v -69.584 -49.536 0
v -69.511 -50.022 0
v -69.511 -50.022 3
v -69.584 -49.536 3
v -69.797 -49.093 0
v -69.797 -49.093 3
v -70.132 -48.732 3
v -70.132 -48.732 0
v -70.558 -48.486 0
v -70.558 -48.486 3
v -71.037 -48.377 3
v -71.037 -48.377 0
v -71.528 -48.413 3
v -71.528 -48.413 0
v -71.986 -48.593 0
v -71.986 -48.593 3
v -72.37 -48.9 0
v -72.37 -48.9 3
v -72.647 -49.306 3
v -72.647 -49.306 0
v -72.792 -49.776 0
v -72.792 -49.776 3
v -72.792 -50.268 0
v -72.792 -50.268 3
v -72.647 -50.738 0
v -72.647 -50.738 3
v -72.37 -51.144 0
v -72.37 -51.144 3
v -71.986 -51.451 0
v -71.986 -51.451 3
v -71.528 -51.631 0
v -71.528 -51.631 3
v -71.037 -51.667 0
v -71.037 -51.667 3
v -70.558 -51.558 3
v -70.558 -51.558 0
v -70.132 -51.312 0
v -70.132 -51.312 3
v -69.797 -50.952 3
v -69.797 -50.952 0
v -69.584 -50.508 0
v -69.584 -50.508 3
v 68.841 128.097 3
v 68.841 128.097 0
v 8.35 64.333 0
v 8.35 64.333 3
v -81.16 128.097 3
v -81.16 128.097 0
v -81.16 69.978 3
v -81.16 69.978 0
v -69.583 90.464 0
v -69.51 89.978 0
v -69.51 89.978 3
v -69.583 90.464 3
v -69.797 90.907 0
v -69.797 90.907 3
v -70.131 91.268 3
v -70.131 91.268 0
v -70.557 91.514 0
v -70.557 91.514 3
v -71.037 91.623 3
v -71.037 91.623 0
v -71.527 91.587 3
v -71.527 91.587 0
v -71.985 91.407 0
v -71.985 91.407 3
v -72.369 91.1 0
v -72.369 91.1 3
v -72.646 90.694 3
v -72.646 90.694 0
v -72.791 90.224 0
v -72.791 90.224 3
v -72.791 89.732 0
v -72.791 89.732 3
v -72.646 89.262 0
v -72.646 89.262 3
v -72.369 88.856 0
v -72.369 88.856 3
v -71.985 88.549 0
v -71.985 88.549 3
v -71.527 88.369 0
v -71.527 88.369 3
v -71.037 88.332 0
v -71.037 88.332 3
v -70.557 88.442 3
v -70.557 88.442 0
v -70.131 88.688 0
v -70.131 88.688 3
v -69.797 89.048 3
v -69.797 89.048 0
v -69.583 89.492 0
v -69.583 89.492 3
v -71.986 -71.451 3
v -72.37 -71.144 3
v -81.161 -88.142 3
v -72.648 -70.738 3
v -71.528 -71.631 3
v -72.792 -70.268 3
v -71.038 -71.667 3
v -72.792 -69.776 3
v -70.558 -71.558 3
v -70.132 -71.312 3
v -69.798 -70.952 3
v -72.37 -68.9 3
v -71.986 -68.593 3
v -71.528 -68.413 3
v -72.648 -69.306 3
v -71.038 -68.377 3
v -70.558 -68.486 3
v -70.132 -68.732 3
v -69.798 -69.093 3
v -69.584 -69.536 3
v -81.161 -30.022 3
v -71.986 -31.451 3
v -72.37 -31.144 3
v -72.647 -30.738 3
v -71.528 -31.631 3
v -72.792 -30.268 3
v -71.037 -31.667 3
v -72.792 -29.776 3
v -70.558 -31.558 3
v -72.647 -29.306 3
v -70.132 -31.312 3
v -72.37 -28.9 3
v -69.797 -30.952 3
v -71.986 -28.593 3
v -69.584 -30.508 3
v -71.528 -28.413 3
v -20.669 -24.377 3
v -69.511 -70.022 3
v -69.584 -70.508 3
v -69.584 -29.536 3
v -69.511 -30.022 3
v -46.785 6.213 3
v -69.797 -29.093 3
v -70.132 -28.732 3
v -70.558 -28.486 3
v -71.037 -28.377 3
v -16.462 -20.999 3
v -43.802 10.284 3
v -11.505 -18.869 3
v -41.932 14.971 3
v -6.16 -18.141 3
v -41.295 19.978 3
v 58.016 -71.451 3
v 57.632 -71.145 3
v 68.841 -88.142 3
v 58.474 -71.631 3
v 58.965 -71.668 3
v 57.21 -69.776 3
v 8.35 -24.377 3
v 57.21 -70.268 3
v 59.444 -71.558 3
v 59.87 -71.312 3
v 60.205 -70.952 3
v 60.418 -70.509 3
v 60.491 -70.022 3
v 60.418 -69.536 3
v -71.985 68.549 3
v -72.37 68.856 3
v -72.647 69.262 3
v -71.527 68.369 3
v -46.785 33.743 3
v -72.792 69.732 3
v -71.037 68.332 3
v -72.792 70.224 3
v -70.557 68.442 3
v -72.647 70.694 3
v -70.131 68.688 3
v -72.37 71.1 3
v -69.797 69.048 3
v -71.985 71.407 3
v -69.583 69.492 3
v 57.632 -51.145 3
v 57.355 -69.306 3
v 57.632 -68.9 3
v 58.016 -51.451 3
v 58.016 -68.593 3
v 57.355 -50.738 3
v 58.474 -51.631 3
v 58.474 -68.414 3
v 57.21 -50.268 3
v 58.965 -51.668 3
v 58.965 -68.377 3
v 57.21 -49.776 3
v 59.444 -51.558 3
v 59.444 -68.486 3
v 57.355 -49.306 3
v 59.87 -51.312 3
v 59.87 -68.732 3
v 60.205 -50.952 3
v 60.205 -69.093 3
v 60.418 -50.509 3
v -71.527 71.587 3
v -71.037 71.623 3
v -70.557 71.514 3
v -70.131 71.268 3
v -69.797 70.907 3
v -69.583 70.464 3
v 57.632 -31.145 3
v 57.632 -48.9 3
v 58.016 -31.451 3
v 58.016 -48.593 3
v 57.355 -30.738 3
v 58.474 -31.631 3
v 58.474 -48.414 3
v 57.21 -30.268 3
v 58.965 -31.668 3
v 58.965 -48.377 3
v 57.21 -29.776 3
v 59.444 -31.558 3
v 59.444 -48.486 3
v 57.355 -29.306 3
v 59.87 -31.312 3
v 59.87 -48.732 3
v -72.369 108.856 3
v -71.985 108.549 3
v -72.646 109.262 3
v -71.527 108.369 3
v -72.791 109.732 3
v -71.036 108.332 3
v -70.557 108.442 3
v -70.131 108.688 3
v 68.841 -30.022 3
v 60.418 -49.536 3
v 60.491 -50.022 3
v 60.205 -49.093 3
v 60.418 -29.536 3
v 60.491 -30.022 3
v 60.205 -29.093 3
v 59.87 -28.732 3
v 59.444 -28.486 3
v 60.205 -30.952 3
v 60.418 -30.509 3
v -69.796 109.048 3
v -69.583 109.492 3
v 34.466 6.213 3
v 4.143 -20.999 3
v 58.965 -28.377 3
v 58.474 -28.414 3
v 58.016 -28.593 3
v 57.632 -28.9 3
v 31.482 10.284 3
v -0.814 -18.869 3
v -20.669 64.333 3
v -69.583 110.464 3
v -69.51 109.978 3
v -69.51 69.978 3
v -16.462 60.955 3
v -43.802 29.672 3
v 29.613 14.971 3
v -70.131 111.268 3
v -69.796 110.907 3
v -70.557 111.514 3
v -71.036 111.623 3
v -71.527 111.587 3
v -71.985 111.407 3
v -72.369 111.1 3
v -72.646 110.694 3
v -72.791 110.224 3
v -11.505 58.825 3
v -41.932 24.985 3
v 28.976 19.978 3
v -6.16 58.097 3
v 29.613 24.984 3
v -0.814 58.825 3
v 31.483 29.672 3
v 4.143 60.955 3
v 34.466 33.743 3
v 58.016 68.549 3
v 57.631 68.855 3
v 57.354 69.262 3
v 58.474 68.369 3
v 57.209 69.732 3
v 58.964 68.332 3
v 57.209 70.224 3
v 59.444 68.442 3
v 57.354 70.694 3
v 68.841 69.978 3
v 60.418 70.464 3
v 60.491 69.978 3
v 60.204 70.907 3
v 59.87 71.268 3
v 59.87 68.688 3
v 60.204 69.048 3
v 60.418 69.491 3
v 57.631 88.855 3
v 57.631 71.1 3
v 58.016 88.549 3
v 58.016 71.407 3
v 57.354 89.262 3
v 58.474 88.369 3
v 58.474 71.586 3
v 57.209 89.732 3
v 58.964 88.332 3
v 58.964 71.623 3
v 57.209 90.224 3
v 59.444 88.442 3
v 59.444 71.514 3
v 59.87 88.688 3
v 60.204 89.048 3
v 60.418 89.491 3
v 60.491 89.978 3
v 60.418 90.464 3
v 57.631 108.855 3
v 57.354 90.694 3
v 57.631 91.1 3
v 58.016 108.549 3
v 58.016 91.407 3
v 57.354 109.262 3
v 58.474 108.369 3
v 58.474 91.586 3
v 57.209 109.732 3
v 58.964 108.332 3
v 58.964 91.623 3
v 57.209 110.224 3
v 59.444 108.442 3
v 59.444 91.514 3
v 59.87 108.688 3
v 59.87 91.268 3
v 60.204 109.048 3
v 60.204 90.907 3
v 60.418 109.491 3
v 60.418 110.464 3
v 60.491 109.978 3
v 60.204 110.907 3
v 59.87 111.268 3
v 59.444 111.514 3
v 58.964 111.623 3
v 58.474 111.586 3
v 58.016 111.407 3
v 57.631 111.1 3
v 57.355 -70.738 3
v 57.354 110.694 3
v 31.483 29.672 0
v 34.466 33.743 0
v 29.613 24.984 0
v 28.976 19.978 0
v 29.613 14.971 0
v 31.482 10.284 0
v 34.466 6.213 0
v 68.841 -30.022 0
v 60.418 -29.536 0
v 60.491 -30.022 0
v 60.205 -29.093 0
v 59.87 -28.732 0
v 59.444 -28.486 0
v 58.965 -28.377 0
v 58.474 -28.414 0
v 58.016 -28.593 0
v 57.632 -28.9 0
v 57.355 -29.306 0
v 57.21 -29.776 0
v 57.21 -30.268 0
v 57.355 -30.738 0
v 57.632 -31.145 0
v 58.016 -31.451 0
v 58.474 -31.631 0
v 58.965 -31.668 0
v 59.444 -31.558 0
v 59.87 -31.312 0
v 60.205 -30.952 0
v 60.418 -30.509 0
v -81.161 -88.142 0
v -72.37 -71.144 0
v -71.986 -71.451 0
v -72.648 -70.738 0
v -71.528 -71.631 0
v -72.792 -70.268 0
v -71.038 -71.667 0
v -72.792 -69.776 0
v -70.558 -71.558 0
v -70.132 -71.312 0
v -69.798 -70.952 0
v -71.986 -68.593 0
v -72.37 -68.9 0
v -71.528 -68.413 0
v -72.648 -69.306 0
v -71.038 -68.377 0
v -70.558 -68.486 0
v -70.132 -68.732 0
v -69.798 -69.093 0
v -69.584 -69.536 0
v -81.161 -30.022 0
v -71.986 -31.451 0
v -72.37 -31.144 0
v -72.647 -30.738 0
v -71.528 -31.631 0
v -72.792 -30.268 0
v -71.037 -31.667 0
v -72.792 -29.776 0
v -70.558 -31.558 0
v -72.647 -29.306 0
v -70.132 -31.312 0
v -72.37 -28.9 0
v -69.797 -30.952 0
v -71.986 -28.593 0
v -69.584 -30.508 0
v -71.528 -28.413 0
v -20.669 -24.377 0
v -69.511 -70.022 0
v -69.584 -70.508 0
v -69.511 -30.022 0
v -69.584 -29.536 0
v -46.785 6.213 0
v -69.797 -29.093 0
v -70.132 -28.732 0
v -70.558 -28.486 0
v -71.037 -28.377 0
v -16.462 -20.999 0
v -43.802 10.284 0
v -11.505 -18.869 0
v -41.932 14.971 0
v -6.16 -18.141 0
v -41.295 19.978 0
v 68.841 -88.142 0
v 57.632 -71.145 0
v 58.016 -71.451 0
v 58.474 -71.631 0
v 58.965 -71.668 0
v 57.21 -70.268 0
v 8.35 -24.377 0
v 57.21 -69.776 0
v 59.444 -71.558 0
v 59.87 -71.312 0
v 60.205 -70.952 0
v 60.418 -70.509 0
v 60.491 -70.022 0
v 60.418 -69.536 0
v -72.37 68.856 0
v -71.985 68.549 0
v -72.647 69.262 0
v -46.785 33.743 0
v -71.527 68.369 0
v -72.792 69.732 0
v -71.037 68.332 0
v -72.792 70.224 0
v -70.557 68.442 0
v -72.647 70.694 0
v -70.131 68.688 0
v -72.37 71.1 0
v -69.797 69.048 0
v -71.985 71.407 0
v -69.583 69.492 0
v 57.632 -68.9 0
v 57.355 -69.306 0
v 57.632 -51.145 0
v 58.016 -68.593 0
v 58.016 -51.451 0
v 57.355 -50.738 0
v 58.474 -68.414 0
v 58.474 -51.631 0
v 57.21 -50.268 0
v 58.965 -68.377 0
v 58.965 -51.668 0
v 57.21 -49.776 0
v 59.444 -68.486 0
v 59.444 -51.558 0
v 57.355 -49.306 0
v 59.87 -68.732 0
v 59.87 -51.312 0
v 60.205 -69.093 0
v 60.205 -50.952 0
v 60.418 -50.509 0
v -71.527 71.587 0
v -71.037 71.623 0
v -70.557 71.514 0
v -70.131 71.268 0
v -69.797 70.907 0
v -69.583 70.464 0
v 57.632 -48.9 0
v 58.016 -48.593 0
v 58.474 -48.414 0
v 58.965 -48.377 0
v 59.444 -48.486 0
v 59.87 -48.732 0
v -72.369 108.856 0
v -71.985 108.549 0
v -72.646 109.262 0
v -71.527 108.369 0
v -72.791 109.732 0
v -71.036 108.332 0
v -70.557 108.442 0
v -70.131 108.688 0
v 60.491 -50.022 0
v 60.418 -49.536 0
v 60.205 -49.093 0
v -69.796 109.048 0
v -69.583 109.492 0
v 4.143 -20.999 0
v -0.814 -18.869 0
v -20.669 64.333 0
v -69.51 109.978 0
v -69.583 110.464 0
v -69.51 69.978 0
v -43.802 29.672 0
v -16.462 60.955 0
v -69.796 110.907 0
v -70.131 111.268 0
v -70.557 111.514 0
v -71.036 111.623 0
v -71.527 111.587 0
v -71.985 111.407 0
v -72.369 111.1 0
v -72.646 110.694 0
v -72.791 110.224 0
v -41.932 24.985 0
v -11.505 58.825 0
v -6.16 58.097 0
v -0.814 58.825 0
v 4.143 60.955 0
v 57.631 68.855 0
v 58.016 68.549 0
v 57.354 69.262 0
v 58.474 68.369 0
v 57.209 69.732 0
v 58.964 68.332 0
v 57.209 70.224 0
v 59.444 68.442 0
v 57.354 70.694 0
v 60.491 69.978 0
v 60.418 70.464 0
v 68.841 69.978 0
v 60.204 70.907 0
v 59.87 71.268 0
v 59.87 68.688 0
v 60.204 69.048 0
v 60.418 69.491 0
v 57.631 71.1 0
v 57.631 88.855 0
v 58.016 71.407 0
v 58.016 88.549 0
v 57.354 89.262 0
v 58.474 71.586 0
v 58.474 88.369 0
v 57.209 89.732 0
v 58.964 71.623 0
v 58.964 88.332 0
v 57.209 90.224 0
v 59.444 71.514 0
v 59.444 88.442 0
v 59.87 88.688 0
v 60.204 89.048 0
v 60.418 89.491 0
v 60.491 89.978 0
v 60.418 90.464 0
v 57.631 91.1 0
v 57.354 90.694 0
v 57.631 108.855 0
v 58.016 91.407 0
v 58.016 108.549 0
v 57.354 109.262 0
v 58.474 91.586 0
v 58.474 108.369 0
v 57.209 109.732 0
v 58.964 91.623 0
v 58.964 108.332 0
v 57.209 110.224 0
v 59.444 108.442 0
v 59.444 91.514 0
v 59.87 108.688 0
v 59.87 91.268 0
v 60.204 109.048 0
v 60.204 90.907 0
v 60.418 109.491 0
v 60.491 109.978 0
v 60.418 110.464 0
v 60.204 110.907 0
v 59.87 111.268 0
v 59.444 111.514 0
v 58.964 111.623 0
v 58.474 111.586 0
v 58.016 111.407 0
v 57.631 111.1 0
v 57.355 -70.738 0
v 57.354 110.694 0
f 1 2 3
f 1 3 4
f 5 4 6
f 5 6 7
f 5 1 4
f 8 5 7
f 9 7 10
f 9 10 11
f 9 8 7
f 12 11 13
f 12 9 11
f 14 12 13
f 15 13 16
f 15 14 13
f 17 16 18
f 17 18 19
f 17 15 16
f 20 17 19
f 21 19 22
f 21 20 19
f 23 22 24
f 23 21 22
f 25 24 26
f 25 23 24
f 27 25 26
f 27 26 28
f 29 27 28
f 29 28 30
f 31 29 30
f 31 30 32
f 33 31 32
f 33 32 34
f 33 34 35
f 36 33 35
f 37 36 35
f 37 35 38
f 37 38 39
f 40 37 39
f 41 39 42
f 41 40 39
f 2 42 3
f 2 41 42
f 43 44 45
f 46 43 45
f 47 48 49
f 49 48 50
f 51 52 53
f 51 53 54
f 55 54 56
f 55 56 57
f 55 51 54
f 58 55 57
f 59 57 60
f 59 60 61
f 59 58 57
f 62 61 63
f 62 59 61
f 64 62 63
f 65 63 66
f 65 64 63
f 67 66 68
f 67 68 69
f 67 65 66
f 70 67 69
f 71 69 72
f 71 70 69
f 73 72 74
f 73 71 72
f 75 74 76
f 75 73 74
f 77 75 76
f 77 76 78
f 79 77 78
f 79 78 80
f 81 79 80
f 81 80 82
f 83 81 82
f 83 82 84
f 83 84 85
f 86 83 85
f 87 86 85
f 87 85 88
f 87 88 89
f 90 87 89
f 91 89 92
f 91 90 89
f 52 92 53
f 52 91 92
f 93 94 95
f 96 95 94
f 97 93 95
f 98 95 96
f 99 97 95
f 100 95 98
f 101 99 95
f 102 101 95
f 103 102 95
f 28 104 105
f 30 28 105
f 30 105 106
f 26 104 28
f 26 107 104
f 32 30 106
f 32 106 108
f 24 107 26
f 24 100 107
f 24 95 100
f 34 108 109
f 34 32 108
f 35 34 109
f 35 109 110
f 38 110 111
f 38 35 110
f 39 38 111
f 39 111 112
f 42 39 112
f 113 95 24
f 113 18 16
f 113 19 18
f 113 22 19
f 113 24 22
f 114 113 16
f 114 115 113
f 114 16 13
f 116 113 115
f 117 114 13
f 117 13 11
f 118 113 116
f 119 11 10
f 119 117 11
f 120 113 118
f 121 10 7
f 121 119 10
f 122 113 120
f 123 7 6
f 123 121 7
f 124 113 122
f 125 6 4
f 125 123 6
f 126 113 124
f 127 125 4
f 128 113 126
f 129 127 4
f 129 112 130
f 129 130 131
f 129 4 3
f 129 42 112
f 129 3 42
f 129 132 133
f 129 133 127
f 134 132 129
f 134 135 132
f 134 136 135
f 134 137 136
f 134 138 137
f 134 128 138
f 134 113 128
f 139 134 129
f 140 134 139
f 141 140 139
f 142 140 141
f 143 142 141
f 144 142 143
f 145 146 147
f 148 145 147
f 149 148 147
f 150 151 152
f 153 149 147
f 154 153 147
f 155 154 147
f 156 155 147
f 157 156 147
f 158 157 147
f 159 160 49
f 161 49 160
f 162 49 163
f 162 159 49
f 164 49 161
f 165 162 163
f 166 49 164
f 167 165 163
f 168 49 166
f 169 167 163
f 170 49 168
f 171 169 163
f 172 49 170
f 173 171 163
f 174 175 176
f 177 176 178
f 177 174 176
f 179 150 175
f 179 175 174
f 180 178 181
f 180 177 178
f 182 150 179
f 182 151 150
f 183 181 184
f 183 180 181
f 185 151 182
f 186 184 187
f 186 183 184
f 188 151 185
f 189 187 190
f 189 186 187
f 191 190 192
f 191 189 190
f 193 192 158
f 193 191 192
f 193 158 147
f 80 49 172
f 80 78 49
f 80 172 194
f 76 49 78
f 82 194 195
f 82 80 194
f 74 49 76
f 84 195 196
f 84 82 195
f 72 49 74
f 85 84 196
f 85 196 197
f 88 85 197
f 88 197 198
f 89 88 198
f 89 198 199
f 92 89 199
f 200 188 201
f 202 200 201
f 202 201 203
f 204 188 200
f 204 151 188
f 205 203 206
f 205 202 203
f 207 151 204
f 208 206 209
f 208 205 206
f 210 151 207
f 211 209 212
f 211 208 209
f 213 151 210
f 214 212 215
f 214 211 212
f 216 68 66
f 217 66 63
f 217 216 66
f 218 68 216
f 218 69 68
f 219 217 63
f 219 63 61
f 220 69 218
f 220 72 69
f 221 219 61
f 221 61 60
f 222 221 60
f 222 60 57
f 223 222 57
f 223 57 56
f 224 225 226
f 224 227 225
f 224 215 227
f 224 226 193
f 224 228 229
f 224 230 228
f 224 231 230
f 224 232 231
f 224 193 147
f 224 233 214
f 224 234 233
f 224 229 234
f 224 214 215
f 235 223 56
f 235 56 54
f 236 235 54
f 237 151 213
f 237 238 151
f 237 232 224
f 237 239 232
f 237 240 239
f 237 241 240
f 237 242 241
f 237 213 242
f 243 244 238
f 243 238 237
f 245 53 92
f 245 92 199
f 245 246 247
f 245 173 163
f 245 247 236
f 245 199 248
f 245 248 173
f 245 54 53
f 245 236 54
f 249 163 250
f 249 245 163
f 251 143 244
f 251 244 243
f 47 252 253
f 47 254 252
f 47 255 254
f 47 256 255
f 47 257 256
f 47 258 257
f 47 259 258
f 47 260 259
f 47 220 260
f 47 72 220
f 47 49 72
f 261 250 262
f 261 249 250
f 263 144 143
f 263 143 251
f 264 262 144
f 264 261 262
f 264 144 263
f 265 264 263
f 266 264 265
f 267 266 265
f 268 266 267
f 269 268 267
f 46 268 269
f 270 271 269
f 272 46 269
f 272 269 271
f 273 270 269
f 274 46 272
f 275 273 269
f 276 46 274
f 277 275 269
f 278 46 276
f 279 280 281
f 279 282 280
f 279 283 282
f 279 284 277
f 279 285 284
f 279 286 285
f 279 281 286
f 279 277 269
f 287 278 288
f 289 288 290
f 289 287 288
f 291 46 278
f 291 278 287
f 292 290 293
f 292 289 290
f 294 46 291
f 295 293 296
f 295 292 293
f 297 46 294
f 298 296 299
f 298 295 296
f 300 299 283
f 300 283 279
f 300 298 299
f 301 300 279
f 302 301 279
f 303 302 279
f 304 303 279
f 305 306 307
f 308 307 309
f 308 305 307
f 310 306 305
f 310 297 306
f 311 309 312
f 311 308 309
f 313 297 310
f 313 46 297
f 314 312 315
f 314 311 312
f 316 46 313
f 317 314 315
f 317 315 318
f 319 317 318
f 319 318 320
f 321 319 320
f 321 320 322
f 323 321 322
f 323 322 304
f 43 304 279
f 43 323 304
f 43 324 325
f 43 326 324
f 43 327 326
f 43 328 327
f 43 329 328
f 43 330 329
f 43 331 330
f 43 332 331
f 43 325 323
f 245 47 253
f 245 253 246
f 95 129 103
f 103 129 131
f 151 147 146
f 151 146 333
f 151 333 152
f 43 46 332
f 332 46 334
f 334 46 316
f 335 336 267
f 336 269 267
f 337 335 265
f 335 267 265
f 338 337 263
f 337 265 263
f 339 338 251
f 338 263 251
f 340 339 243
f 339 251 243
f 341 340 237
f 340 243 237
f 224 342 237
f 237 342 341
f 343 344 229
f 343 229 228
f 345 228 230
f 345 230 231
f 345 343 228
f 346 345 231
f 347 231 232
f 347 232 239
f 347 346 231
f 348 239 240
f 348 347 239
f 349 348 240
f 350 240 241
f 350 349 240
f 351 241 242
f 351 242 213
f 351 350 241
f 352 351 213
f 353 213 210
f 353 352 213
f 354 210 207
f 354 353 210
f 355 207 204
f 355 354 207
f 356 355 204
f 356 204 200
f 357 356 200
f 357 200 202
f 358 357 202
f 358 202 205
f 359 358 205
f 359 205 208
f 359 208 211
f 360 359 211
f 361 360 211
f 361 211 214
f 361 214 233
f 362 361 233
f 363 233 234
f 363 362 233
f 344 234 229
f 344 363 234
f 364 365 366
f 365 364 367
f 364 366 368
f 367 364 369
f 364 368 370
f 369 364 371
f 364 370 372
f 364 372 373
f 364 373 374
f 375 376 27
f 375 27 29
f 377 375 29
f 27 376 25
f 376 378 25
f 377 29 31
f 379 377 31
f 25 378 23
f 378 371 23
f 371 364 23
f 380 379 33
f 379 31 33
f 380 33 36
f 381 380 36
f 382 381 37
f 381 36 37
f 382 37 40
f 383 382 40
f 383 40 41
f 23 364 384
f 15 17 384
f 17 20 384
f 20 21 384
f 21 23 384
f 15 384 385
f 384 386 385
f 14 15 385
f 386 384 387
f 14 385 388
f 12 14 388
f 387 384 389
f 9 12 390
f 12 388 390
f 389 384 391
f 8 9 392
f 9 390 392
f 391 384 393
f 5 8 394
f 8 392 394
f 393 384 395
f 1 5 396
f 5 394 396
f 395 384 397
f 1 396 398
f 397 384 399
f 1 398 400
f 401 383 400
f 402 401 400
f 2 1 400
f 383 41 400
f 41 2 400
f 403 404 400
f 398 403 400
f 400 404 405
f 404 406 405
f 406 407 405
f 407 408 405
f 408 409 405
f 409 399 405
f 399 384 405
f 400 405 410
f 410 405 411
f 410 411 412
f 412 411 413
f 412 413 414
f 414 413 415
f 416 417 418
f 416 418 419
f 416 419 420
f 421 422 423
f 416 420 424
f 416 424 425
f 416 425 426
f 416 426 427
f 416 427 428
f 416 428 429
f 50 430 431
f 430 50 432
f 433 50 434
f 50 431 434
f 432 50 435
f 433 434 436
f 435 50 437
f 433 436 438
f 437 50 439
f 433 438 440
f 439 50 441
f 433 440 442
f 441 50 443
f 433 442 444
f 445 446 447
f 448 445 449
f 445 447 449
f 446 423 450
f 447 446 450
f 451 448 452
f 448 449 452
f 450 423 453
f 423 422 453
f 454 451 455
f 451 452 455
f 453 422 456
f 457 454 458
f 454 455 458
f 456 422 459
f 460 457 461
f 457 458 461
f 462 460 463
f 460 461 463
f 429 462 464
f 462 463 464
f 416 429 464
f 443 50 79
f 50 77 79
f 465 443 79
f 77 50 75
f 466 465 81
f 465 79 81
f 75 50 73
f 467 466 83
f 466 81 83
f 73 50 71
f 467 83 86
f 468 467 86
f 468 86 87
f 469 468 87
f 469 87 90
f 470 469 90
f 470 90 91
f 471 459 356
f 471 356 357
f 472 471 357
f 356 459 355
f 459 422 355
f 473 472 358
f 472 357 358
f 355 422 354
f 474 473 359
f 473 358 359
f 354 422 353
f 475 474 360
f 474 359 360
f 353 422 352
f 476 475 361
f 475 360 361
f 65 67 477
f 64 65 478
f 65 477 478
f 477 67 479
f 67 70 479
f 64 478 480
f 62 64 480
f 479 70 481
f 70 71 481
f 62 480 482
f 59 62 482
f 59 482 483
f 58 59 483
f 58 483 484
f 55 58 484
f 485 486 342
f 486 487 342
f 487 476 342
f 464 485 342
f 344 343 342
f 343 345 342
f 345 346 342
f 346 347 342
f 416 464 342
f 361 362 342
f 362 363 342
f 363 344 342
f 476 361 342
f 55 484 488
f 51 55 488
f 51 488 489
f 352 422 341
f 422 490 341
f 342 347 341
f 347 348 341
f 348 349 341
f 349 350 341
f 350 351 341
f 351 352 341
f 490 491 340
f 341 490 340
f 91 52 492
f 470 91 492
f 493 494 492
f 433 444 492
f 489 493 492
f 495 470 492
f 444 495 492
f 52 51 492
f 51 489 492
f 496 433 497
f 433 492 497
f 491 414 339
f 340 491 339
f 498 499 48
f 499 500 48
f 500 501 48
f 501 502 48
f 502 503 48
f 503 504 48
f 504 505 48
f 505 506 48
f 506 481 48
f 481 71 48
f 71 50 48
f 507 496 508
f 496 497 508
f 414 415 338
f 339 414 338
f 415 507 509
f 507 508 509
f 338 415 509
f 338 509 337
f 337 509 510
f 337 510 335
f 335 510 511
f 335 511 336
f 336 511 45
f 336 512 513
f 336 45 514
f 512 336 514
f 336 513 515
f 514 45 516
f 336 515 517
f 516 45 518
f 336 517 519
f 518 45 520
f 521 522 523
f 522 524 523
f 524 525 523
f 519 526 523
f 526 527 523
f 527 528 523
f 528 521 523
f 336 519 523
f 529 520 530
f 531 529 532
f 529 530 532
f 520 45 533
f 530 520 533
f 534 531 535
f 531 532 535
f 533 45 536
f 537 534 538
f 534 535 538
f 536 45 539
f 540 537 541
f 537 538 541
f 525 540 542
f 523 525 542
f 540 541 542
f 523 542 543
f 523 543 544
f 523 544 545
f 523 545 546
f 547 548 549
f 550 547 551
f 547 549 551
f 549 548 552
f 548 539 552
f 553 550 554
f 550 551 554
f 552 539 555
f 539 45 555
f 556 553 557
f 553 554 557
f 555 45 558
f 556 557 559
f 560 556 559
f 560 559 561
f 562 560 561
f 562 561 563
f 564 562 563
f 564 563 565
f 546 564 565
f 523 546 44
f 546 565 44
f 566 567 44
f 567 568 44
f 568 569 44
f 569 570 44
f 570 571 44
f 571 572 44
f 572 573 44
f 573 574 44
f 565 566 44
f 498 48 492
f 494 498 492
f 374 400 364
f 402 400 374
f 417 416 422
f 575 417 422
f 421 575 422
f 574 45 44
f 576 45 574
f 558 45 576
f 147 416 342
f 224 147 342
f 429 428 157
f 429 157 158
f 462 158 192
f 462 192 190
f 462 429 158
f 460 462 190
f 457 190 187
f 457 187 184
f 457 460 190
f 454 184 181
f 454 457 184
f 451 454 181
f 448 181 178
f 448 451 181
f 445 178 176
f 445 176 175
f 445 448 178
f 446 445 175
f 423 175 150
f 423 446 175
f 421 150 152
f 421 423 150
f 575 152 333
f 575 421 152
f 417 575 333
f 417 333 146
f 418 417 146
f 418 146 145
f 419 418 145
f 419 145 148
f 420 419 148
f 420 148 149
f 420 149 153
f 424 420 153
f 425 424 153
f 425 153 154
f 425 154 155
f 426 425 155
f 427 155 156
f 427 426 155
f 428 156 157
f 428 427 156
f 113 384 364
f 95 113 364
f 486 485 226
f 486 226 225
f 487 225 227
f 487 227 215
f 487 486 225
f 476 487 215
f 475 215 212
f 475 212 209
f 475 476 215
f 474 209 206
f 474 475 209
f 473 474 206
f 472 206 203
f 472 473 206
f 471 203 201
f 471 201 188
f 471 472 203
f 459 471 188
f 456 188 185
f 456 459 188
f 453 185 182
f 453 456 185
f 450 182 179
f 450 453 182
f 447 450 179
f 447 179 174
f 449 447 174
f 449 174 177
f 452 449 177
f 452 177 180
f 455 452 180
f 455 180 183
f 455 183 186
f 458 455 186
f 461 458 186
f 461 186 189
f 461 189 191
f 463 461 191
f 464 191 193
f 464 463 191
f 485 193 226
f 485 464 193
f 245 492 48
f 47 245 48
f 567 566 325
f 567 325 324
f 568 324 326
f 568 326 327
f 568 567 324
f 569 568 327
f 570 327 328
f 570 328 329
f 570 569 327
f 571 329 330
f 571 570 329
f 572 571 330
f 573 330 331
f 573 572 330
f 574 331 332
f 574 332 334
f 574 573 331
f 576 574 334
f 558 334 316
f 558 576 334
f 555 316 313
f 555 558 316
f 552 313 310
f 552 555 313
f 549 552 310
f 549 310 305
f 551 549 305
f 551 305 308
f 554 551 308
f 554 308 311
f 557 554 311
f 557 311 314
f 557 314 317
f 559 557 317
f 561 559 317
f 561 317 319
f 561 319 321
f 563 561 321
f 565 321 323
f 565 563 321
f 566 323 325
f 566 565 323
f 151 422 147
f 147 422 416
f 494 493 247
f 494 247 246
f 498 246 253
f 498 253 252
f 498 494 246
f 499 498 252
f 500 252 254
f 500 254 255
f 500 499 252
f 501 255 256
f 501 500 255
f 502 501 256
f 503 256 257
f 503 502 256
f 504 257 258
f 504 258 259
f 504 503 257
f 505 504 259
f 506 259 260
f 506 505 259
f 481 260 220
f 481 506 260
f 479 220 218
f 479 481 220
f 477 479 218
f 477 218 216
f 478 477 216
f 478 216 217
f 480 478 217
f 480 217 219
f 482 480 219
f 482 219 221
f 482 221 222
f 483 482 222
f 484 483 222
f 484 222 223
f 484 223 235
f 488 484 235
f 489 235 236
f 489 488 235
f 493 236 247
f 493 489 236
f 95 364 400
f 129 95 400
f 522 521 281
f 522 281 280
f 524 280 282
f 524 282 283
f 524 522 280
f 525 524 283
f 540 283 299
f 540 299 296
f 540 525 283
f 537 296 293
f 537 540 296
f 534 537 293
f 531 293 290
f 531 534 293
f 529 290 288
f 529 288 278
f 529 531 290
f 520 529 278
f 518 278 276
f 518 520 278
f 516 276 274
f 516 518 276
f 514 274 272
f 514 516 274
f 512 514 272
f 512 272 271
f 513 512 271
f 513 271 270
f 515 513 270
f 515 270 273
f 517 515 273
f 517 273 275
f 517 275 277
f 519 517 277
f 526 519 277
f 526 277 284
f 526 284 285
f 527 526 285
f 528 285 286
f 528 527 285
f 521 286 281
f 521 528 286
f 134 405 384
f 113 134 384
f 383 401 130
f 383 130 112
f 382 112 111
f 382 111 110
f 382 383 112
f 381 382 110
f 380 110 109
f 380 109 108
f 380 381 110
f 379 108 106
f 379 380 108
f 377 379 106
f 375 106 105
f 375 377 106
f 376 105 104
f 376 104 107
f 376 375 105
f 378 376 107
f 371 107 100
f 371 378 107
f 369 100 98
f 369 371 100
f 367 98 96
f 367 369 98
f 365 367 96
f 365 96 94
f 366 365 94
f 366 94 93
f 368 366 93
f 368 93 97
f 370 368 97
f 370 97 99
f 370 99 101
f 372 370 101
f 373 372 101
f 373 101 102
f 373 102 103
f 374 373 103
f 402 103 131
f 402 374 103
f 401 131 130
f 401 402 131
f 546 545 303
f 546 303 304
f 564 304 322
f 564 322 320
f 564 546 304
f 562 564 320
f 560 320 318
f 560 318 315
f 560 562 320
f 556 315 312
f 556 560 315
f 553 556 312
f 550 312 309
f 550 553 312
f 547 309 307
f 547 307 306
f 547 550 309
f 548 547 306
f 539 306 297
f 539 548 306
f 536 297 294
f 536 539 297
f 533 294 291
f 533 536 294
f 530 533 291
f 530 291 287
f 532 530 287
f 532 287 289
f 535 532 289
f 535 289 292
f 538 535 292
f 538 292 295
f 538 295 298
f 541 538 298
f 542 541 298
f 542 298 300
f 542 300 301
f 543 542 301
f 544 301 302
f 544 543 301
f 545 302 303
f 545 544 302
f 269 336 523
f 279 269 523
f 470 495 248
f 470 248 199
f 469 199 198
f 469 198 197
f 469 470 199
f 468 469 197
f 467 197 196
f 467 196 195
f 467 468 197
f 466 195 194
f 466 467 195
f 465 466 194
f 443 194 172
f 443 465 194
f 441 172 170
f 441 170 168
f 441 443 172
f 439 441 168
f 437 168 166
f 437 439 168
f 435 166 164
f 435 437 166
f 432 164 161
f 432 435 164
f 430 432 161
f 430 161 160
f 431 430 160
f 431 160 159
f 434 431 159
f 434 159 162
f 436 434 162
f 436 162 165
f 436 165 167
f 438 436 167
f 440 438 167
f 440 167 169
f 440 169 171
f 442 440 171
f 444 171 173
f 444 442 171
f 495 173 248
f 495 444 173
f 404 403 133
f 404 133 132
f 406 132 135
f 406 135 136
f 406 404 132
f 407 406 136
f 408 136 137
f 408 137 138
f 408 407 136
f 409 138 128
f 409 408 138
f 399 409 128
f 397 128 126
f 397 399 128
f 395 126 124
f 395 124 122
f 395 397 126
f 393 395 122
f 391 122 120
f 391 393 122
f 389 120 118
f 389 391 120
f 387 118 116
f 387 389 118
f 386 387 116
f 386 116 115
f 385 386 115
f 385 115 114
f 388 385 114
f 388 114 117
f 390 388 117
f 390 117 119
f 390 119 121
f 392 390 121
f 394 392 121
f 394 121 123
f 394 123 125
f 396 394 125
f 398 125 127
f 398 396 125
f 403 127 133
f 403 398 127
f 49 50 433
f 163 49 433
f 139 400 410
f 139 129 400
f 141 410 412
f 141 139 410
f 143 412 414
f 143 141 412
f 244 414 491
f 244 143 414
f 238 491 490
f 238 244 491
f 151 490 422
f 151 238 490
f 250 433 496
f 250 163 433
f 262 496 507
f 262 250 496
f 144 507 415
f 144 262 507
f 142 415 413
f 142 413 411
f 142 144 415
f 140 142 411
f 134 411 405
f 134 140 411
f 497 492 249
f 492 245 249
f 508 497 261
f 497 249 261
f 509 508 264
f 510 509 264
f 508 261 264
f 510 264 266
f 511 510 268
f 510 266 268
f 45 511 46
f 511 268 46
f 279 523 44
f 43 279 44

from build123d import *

# Parameters (mm, degrees)
SKETCH_1_R      = 1.65
EXTRUDE_1_DEPTH = 3
FILLET_1_R      = 20


with BuildPart() as part:
    # 草图1 → 凸台-拉伸1 (new body)
    with BuildSketch(Plane.XY):
        Polygon((-81.159641577, 128.097043492), (-81.160013188, 69.97789137), (-33.727366855, 19.978035289), (-81.160652583, -30.022108629), (-81.161024198, -88.141807947), (-6.159655428, -9.081730725), (68.841408465, -88.142097171), (68.841260976, -30.022397853), (21.408168061, 19.97792898), (68.841007207, 69.977602148), (68.840859718, 128.096754271), (-6.159543366, 49.037694994), align=None)
        with Locations((-71.160908341, -70.022108629)):
            Circle(SKETCH_1_R, mode=Mode.SUBTRACT)
        with Locations((-71.160780462, -50.022108629)):
            Circle(SKETCH_1_R, mode=Mode.SUBTRACT)
        with Locations((-71.160652583, -30.022108629)):
            Circle(SKETCH_1_R, mode=Mode.SUBTRACT)
        with Locations((58.841362483, -70.02235929)):
            Circle(SKETCH_1_R, mode=Mode.SUBTRACT)
        with Locations((58.841311729, -50.02235929)):
            Circle(SKETCH_1_R, mode=Mode.SUBTRACT)
        with Locations((58.841260976, -30.02235929)):
            Circle(SKETCH_1_R, mode=Mode.SUBTRACT)
        with Locations((-71.160013188, 69.97787102)):
            Circle(SKETCH_1_R, mode=Mode.SUBTRACT)
        with Locations((-71.159885309, 89.977871019)):
            Circle(SKETCH_1_R, mode=Mode.SUBTRACT)
        with Locations((-71.15975743, 109.977871019)):
            Circle(SKETCH_1_R, mode=Mode.SUBTRACT)
        with Locations((58.841007207, 69.977620361)):
            Circle(SKETCH_1_R, mode=Mode.SUBTRACT)
        with Locations((58.840956453, 89.977620361)):
            Circle(SKETCH_1_R, mode=Mode.SUBTRACT)
        with Locations((58.840905699, 109.977620361)):
            Circle(SKETCH_1_R, mode=Mode.SUBTRACT)
    extrude(amount=EXTRUDE_1_DEPTH)

    # 圆角1
    fillet_1_edges = [part.edges().sort_by_distance(p)[0] for p in [
        (21.408168061, 19.97792898, 1.5),
        (-6.159655428, -9.081730725, 1.5),
        (-33.727366855, 19.978035289, 1.5),
        (-6.159543366, 49.037694994, 1.5),
    ]]
    fillet(fillet_1_edges, radius=FILLET_1_R)


solid = part.part
